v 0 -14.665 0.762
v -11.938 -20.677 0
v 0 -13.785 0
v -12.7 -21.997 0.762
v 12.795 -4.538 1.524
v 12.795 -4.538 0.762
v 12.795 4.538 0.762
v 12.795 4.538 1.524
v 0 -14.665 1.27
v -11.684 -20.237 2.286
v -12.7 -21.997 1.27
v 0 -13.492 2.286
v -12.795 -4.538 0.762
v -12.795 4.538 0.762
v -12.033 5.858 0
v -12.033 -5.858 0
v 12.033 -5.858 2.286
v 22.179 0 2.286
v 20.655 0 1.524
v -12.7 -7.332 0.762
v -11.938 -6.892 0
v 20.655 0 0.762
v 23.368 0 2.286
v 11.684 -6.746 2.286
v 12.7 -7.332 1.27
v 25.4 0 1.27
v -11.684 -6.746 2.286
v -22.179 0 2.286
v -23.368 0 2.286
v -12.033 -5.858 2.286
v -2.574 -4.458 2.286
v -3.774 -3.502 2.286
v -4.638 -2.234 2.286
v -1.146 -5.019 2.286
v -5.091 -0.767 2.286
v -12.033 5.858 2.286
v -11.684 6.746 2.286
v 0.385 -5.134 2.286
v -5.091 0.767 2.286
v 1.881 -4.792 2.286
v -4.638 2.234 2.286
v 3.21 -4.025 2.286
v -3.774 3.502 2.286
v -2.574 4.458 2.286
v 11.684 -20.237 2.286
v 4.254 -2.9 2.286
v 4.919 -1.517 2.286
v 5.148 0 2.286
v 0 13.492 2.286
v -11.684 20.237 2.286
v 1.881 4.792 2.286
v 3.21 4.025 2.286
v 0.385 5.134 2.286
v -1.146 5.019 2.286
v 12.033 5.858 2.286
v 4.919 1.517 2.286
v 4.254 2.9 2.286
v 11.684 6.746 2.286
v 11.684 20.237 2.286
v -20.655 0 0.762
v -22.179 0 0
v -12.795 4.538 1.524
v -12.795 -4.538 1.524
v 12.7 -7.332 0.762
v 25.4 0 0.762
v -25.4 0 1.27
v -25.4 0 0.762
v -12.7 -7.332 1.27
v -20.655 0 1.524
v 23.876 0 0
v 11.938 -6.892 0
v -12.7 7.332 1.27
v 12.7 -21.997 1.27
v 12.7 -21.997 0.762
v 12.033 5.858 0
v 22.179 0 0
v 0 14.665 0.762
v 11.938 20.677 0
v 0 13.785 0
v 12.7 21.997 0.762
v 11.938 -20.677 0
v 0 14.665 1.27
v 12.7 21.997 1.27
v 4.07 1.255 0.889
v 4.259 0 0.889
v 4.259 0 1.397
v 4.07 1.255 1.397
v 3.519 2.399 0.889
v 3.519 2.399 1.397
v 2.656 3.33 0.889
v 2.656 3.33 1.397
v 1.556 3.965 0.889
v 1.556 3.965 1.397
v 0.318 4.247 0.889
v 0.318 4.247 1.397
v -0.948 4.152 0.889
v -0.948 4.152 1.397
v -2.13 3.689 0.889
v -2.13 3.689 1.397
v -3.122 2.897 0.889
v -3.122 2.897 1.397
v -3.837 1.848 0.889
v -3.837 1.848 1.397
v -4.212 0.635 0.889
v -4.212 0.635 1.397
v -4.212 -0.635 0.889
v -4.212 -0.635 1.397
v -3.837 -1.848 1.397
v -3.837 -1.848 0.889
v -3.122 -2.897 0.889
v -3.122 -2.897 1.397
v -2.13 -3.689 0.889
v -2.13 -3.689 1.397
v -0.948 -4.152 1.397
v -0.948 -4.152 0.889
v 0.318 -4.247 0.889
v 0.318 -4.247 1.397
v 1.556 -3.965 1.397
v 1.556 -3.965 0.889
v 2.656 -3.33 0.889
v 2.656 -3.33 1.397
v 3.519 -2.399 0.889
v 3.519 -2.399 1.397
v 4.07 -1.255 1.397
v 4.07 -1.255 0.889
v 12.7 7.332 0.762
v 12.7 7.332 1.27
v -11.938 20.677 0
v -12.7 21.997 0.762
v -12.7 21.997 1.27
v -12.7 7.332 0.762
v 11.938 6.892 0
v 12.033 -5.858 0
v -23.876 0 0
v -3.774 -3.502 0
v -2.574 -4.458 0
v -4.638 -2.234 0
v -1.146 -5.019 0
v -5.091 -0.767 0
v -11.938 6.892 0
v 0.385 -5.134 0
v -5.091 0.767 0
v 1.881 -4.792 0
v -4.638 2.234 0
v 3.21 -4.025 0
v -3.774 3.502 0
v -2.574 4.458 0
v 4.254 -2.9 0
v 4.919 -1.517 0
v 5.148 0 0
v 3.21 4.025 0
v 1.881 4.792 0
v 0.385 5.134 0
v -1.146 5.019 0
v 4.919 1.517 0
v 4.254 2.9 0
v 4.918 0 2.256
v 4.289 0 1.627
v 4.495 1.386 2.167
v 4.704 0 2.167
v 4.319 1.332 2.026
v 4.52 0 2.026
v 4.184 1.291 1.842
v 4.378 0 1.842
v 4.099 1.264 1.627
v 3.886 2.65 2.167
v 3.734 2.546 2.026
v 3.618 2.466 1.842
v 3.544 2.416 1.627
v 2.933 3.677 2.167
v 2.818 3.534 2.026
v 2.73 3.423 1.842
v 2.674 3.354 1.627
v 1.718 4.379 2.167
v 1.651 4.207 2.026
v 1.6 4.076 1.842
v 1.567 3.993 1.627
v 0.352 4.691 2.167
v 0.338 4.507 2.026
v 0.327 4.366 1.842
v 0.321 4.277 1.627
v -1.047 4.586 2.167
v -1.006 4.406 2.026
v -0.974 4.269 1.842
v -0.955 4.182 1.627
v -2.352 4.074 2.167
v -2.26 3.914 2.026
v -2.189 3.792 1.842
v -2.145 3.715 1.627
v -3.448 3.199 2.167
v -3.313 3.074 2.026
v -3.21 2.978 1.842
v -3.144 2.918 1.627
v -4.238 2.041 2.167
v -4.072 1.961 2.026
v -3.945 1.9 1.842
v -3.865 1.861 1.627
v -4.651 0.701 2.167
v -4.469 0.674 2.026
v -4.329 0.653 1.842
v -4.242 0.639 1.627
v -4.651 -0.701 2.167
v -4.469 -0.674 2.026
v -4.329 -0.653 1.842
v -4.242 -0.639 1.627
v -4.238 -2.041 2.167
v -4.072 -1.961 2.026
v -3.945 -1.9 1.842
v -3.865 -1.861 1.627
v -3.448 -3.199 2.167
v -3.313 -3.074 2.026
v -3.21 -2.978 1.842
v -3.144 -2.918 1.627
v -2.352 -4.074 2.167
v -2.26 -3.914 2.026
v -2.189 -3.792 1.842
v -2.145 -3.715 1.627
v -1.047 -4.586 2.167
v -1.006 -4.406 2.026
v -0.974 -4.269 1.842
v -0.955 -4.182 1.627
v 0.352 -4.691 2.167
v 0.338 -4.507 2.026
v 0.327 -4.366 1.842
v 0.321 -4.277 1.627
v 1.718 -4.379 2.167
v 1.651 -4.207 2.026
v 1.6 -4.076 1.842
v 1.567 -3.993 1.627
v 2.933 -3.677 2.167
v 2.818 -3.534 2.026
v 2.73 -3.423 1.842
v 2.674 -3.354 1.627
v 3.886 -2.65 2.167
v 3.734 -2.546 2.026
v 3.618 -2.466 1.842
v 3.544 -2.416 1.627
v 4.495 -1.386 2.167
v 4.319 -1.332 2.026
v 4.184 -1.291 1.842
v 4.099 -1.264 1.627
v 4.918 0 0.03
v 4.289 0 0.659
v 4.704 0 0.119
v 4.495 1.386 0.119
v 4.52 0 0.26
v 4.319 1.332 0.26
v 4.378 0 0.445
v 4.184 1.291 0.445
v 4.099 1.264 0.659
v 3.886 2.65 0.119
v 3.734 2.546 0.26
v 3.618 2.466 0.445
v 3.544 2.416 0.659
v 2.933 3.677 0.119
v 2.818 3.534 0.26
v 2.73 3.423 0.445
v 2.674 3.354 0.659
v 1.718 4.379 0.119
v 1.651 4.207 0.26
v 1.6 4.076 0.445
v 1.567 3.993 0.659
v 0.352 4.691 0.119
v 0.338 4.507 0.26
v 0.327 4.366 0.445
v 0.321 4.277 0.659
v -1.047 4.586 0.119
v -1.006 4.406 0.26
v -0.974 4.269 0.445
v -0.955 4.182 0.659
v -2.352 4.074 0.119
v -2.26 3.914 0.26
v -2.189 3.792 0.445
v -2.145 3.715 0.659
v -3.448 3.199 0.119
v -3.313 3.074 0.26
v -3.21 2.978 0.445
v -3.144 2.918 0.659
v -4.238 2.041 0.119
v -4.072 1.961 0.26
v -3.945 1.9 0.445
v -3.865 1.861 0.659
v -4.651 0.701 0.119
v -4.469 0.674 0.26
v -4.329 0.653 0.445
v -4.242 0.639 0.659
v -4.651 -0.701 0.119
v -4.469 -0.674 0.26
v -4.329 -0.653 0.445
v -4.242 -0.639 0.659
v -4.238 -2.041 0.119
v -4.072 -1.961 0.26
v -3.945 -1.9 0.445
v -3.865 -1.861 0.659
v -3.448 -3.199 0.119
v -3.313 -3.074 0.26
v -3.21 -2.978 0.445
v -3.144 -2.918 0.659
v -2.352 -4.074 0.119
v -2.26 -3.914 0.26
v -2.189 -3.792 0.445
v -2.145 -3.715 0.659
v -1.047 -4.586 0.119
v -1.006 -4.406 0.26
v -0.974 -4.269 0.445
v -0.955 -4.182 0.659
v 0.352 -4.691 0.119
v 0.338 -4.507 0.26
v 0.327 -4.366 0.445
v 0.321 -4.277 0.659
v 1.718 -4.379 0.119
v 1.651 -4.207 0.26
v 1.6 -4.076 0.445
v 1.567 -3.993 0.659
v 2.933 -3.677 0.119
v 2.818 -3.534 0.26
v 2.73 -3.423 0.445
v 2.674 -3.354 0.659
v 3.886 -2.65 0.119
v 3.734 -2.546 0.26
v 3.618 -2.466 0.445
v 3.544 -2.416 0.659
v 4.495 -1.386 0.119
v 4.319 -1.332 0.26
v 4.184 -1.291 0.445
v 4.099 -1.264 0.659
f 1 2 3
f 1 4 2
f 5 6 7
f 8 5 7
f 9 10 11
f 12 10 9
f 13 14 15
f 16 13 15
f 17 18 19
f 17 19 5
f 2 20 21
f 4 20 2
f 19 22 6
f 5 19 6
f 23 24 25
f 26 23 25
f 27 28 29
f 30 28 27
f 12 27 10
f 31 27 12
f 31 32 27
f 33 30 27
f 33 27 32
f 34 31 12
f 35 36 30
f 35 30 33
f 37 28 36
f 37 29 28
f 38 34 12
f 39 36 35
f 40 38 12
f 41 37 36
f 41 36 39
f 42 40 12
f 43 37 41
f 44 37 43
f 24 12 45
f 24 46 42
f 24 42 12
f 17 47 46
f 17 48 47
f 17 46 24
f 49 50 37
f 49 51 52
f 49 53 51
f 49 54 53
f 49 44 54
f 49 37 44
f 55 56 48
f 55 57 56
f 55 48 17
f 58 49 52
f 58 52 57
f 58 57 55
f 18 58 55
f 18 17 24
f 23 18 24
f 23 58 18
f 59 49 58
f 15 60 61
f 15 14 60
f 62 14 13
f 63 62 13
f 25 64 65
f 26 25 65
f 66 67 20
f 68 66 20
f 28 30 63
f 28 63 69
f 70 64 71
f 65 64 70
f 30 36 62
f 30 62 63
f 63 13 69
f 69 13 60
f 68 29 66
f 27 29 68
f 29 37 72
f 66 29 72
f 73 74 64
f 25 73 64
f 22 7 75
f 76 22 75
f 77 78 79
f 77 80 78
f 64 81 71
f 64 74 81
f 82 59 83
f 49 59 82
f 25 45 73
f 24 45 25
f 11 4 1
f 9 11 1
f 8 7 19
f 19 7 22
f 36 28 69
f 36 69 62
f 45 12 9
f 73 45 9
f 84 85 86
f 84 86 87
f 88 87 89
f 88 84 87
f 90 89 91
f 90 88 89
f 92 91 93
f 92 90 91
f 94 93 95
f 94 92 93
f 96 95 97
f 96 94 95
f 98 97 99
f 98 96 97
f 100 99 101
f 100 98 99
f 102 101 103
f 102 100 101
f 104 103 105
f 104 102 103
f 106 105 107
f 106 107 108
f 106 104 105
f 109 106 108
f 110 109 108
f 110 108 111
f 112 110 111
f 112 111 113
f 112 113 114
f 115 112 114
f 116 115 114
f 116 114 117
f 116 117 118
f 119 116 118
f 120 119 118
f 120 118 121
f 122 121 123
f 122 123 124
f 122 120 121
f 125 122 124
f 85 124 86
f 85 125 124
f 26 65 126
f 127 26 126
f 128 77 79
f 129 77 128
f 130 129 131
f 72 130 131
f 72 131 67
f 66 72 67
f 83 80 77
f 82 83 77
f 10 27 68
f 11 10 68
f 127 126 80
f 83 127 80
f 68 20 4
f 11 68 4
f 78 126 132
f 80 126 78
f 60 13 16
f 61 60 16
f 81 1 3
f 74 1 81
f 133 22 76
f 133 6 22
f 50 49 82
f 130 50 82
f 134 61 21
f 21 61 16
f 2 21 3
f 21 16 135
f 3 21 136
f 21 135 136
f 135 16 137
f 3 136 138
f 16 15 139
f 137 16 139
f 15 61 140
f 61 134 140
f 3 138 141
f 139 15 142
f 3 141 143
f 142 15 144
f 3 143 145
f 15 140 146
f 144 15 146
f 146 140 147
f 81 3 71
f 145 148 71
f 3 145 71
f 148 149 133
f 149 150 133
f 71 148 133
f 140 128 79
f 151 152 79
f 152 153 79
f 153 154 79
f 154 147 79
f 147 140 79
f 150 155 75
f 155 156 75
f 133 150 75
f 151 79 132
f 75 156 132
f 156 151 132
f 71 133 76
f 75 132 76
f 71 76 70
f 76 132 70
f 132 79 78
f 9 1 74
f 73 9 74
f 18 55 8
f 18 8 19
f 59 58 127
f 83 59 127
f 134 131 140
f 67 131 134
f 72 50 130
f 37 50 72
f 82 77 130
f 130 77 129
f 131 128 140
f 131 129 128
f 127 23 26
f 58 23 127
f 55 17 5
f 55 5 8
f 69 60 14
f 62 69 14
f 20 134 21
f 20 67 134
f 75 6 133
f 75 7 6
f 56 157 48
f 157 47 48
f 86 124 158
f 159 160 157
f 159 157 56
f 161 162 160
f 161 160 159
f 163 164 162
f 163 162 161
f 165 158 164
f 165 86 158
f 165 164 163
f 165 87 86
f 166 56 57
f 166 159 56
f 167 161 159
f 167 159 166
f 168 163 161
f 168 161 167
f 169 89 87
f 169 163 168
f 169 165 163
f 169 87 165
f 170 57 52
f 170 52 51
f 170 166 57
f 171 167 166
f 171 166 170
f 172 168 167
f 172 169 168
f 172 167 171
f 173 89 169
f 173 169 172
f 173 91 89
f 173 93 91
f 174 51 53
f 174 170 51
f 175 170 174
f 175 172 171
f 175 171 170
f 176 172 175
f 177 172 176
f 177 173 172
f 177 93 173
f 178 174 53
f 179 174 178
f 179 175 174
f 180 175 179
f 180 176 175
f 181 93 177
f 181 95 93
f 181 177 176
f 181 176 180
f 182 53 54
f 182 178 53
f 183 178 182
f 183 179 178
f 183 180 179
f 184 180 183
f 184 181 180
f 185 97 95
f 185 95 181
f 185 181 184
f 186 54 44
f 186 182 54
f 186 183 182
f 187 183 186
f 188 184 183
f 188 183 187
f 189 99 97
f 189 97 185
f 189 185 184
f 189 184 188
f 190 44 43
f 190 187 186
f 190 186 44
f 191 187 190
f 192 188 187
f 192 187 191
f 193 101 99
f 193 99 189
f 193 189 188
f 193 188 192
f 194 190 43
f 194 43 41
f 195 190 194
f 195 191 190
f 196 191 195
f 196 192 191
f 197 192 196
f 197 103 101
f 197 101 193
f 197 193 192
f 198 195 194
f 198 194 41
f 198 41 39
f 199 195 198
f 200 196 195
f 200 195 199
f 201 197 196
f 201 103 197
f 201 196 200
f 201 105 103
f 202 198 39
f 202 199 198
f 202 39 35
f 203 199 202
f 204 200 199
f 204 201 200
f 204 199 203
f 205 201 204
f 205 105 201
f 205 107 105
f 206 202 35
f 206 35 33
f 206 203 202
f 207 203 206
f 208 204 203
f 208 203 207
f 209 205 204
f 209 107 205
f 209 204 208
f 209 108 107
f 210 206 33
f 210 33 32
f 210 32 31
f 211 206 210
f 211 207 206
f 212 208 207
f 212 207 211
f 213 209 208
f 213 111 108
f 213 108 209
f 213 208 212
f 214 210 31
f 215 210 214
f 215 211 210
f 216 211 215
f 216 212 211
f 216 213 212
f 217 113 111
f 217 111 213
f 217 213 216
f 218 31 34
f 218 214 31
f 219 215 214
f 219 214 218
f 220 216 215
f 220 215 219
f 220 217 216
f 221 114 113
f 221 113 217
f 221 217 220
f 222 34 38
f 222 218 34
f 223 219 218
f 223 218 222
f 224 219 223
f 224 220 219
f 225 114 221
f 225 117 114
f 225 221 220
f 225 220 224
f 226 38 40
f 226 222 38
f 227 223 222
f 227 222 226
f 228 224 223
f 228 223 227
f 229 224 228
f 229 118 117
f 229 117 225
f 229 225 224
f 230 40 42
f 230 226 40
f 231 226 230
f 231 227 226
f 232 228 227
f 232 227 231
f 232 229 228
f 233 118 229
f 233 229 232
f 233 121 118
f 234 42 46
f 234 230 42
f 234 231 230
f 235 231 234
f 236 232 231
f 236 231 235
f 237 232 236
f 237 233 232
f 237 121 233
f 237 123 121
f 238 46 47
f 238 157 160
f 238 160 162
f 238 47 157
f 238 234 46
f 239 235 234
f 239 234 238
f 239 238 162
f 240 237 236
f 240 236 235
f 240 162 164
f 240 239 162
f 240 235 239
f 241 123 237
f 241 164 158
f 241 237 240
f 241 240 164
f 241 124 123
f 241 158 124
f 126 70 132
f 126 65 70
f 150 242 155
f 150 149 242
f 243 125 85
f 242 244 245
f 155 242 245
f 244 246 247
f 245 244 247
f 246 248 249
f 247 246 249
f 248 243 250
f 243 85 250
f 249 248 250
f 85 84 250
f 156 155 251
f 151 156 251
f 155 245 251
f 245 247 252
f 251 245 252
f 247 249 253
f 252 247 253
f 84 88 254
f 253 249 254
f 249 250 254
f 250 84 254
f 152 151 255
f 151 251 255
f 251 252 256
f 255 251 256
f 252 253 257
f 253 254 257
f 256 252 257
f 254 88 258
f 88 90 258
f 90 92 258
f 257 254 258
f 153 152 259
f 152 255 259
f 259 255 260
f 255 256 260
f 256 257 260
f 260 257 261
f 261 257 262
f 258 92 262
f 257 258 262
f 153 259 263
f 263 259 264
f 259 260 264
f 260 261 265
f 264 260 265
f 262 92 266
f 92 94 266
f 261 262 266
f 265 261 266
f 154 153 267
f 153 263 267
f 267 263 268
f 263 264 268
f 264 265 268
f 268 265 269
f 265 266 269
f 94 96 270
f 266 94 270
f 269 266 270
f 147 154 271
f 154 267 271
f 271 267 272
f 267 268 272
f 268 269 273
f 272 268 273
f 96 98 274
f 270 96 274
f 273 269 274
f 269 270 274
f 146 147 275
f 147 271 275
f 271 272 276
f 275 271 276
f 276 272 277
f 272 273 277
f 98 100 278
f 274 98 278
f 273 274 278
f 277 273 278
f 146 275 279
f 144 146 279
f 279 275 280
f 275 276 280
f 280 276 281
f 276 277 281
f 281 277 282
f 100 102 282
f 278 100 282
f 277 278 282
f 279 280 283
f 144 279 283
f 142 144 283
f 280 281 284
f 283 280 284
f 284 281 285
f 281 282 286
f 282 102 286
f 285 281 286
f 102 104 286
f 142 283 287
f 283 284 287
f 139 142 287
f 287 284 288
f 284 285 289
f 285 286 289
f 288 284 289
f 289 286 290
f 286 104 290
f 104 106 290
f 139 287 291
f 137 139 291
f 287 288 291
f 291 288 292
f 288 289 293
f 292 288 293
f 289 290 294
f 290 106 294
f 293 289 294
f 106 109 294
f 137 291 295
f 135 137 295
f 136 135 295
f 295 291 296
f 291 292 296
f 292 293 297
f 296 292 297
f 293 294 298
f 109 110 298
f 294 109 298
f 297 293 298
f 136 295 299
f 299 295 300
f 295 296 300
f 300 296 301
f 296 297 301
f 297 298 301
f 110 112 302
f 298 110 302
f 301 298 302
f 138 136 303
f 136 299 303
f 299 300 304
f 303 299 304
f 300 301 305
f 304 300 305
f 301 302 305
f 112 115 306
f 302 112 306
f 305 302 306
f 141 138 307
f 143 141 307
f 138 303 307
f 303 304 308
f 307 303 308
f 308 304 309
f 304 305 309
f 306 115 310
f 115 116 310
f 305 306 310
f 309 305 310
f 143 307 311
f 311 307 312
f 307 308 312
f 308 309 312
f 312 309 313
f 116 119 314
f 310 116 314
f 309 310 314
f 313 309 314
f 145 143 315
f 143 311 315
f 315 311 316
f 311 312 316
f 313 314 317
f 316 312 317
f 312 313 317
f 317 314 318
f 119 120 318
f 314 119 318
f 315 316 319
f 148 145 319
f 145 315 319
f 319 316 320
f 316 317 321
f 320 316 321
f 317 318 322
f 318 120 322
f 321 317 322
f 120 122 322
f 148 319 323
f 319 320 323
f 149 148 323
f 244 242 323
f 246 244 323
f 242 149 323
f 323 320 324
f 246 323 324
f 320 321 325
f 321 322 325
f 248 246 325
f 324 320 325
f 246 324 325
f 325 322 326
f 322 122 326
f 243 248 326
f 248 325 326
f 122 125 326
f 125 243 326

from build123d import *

# Parameters (mm, degrees)
F0_R     = 4.2591952999
F1_DEPTH = 2.286
F2_SIZE  = 1.016
F3_R     = 0.889
F4_SIZE  = 0.762
F5_SIZE  = 0.762


with BuildPart() as f1:
    # F0 (on Top) → F1 (new body)
    with BuildSketch(Plane.XY):
        Polygon((0, 14.6646975499), (-12.700000617, 21.9970463248), (-12.700000617, 7.3323487749), align=None)
        Polygon((12.700000617, 21.9970463248), (0, 14.6646975499), (12.700000617, 7.3323487749), align=None)
        Polygon((12.700000617, 7.3323487749), (0, 14.6646975499), (-12.700000617, 7.3323487749), (-12.700000617, -7.3323487749), (0, -14.6646975499), (12.700000617, -7.3323487749), align=None)
        Circle(F0_R, mode=Mode.SUBTRACT)
        Polygon((-12.700000617, -7.3323487749), (-12.700000617, 7.3323487749), (-25.400001234, 0), align=None)
        Polygon((-20.6551154208, 0), (-12.7952113226, 4.5379177469), (-12.7952113226, -4.5379177469), align=None, mode=Mode.SUBTRACT)
        Polygon((25.400001234, 0), (12.700000617, 7.3323487749), (12.700000617, -7.3323487749), align=None)
        Polygon((12.7952113226, -4.5379177469), (12.7952113226, 4.5379177469), (20.6551154208, 0), align=None, mode=Mode.SUBTRACT)
        Polygon((0, -14.6646975499), (-12.700000617, -7.3323487749), (-12.700000617, -21.9970463248), align=None)
        Polygon((12.700000617, -21.9970463248), (12.700000617, -7.3323487749), (0, -14.6646975499), align=None)
    extrude(amount=F1_DEPTH)

    # F2
    f2_edges = [f1.edges().sort_by_distance(p)[0] for p in [
        (-6.35, 18.330872, 2.286),
        (-12.700001, 14.664698, 2.286),
        (-19.050001, 3.666174, 2.286),
        (-19.050001, -3.666174, 2.286),
        (-12.700001, -14.664698, 2.286),
        (-6.35, -18.330872, 2.286),
        (6.35, -18.330872, 2.286),
        (12.700001, -14.664698, 2.286),
        (19.050001, -3.666174, 2.286),
        (19.050001, 3.666174, 2.286),
        (12.700001, 14.664698, 2.286),
        (6.35, 18.330872, 2.286),
    ]]
    chamfer(f2_edges, length=F2_SIZE)

    # F3
    f3_edges = [f1.edges().sort_by_distance(p)[0] for p in [
        (-4.259195, 0, 0),
        (-4.259195, 0, 2.286),
    ]]
    fillet(f3_edges, radius=F3_R)

    # F4
    f4_edges = [f1.edges().sort_by_distance(p)[0] for p in [
        (-6.35, -18.330872, 0),
        (6.35, -18.330872, 0),
        (12.700001, -14.664698, 0),
        (19.050001, -3.666174, 0),
        (19.050001, 3.666174, 0),
        (12.700001, 14.664698, 0),
        (6.35, 18.330872, 0),
        (-6.35, 18.330872, 0),
        (-12.700001, 14.664698, 0),
        (-19.050001, 3.666174, 0),
        (-19.050001, -3.666174, 0),
        (-12.700001, -14.664698, 0),
    ]]
    chamfer(f4_edges, length=F4_SIZE)

    # F5
    f5_edges = [f1.edges().sort_by_distance(p)[0] for p in [
        (-16.725163, 2.268959, 2.286),
        (-12.795211, 0, 2.286),
        (-16.725163, -2.268959, 2.286),
        (12.795211, 0, 2.286),
        (16.725163, 2.268959, 2.286),
        (16.725163, -2.268959, 2.286),
        (16.725163, 2.268959, 0),
        (12.795211, 0, 0),
        (16.725163, -2.268959, 0),
        (-16.725163, 2.268959, 0),
        (-16.725163, -2.268959, 0),
        (-12.795211, 0, 0),
    ]]
    chamfer(f5_edges, length=F5_SIZE)


solid = f1.part
